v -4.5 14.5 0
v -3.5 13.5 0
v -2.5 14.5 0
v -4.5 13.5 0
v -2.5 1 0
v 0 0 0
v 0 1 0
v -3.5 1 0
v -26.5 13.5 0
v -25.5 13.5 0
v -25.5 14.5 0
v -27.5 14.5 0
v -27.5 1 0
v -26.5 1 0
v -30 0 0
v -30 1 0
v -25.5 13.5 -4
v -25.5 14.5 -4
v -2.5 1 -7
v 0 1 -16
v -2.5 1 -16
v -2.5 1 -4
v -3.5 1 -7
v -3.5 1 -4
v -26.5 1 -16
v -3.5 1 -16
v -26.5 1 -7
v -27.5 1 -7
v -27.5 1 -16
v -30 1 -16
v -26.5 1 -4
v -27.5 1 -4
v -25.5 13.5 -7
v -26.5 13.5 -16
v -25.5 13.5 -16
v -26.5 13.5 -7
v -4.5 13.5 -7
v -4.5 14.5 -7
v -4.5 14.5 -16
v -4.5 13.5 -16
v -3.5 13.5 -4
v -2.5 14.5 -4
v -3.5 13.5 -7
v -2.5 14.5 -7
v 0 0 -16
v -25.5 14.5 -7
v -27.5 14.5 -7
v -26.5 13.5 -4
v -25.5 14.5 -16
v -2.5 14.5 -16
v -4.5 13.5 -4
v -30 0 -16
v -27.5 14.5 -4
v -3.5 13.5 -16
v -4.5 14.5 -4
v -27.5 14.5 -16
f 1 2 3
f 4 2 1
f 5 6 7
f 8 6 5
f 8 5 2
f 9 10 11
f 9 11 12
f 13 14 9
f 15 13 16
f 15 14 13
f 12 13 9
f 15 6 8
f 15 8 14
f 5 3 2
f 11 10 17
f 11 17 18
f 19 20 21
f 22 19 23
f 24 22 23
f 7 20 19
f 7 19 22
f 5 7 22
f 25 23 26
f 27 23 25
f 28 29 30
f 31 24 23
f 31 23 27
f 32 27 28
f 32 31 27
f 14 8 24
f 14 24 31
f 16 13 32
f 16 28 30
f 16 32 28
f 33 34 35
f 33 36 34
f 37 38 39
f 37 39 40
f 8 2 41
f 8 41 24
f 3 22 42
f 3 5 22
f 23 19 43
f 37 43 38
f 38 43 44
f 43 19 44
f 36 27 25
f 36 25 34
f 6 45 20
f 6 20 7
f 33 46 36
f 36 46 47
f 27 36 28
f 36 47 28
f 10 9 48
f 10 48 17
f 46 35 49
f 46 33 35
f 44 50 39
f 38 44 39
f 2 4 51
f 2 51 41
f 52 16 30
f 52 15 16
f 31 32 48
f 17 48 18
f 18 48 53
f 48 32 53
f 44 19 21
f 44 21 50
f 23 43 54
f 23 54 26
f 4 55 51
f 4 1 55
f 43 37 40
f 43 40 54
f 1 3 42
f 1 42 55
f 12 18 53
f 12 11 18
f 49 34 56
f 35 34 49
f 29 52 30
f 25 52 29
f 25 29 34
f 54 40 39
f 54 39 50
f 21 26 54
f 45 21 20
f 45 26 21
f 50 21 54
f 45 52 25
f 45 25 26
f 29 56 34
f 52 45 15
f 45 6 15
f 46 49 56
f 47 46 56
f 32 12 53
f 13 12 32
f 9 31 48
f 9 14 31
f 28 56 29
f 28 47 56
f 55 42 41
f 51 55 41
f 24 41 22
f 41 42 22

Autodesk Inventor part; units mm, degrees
ref_plane "YZ Plane" through (0, 0, 0) normal (1, 0, 0) x (0, 1, 0)
ref_plane "XZ Plane" through (0, 0, 0) normal (0, 1, 0) x (-1, 0, 0)
ref_plane "XY Plane" through (0, 0, 0) normal (0, 0, 1) x (1, 0, 0)
sketch "Skizze1" plane through (0, 0, 0) normal (0, 1, 0) x (-1, 0, 0)
  line L0 (0, 0) -> (30, 0)
  line L1 (30, 0) -> (30, -16)
  line L2 (30, -16) -> (0, -16)
  line L3 (0, -16) -> (0, 0)
  dimension "d0" = 30
  dimension "d1" = 16
extrude "Extrusion1" add sketch "Skizze1" along normal blind 1
sketch "Skizze2" plane through (-30, 0, 0) normal (0, 0, 1) x (1, 0, 0)
  line L0 (30, 1) -> (0, 1) projected
  line L1 (27.5, 1) -> (27.5, 14.5)
  line L2 (27.5, 1) -> (41, 1) construction
  line L3 (27.5, 14.5) -> (25.5, 14.5)
  line L4 (25.5, 14.5) -> (25.5, 13.5)
  line L5 (25.5, 13.5) -> (26.5, 13.5)
  line L6 (26.5, 13.5) -> (26.5, 1)
  line L7 (26.5, 1) -> (27.5, 1)
  line L8 (15, 1) -> (15, 5.7863)
  point P0 (30, 0)
  point P1 (15, 3.3931)
  point P2 (26.5, 1)
  dimension "d4" = 13.5
  dimension "d5" = 90
  dimension "d6" = 2
  dimension "d7" = 1
  dimension "d8" = 1
  dimension "d9" = 11.5
extrude "Extrusion2" add sketch "Skizze2" against normal blind 16
ref_plane "Arbeitsebene1" through (-15, 0, 0) normal (1, 0, 0) x (0, 0, -1)
sketch "Skizze3" plane through (-2.5, 1, 0) normal (1, 0, 0) x (0, 0, -1)
  line L0 (16, 0) -> (0, 0) projected
  line L1 (4, 0) -> (7, 0)
  line L2 (7, 0) -> (7, 14.6067)
  line L3 (7, 14.6067) -> (4, 14.6067)
  line L4 (4, 14.6067) -> (4, 0)
  point P0 (0, -1)
  point P1 (7, 0)
  dimension "d12" = 3
extrude "Extrusion3" cut sketch "Skizze3" against normal blind 16
mirror "Spiegeln1" about plane through (-15, 0, 0) normal (1, 0, 0) of "Extrusion2", "Extrusion3"
equation "\"Biegeradius\" = Stärke"
equation "\"BreiteBiegungsfreistellung\" = Stärke"
equation "\"TiefeBiegungsfreistellung\" = 0.5 * Stärke"
equation "\"GrößeEckenfreistellung\" = 4 * Stärke"
equation "\"MinimalRest\" = 2 * Stärke"
equation "\"Übergangsradius\" = Biegeradius"
equation "\"JacobiRadiusGröße\" = Biegeradius"
equation "\"Abstandsgröße\" = Stärke"
equation "\"Stärke\" = 0.5"
properties part number "ServoHalterung"
